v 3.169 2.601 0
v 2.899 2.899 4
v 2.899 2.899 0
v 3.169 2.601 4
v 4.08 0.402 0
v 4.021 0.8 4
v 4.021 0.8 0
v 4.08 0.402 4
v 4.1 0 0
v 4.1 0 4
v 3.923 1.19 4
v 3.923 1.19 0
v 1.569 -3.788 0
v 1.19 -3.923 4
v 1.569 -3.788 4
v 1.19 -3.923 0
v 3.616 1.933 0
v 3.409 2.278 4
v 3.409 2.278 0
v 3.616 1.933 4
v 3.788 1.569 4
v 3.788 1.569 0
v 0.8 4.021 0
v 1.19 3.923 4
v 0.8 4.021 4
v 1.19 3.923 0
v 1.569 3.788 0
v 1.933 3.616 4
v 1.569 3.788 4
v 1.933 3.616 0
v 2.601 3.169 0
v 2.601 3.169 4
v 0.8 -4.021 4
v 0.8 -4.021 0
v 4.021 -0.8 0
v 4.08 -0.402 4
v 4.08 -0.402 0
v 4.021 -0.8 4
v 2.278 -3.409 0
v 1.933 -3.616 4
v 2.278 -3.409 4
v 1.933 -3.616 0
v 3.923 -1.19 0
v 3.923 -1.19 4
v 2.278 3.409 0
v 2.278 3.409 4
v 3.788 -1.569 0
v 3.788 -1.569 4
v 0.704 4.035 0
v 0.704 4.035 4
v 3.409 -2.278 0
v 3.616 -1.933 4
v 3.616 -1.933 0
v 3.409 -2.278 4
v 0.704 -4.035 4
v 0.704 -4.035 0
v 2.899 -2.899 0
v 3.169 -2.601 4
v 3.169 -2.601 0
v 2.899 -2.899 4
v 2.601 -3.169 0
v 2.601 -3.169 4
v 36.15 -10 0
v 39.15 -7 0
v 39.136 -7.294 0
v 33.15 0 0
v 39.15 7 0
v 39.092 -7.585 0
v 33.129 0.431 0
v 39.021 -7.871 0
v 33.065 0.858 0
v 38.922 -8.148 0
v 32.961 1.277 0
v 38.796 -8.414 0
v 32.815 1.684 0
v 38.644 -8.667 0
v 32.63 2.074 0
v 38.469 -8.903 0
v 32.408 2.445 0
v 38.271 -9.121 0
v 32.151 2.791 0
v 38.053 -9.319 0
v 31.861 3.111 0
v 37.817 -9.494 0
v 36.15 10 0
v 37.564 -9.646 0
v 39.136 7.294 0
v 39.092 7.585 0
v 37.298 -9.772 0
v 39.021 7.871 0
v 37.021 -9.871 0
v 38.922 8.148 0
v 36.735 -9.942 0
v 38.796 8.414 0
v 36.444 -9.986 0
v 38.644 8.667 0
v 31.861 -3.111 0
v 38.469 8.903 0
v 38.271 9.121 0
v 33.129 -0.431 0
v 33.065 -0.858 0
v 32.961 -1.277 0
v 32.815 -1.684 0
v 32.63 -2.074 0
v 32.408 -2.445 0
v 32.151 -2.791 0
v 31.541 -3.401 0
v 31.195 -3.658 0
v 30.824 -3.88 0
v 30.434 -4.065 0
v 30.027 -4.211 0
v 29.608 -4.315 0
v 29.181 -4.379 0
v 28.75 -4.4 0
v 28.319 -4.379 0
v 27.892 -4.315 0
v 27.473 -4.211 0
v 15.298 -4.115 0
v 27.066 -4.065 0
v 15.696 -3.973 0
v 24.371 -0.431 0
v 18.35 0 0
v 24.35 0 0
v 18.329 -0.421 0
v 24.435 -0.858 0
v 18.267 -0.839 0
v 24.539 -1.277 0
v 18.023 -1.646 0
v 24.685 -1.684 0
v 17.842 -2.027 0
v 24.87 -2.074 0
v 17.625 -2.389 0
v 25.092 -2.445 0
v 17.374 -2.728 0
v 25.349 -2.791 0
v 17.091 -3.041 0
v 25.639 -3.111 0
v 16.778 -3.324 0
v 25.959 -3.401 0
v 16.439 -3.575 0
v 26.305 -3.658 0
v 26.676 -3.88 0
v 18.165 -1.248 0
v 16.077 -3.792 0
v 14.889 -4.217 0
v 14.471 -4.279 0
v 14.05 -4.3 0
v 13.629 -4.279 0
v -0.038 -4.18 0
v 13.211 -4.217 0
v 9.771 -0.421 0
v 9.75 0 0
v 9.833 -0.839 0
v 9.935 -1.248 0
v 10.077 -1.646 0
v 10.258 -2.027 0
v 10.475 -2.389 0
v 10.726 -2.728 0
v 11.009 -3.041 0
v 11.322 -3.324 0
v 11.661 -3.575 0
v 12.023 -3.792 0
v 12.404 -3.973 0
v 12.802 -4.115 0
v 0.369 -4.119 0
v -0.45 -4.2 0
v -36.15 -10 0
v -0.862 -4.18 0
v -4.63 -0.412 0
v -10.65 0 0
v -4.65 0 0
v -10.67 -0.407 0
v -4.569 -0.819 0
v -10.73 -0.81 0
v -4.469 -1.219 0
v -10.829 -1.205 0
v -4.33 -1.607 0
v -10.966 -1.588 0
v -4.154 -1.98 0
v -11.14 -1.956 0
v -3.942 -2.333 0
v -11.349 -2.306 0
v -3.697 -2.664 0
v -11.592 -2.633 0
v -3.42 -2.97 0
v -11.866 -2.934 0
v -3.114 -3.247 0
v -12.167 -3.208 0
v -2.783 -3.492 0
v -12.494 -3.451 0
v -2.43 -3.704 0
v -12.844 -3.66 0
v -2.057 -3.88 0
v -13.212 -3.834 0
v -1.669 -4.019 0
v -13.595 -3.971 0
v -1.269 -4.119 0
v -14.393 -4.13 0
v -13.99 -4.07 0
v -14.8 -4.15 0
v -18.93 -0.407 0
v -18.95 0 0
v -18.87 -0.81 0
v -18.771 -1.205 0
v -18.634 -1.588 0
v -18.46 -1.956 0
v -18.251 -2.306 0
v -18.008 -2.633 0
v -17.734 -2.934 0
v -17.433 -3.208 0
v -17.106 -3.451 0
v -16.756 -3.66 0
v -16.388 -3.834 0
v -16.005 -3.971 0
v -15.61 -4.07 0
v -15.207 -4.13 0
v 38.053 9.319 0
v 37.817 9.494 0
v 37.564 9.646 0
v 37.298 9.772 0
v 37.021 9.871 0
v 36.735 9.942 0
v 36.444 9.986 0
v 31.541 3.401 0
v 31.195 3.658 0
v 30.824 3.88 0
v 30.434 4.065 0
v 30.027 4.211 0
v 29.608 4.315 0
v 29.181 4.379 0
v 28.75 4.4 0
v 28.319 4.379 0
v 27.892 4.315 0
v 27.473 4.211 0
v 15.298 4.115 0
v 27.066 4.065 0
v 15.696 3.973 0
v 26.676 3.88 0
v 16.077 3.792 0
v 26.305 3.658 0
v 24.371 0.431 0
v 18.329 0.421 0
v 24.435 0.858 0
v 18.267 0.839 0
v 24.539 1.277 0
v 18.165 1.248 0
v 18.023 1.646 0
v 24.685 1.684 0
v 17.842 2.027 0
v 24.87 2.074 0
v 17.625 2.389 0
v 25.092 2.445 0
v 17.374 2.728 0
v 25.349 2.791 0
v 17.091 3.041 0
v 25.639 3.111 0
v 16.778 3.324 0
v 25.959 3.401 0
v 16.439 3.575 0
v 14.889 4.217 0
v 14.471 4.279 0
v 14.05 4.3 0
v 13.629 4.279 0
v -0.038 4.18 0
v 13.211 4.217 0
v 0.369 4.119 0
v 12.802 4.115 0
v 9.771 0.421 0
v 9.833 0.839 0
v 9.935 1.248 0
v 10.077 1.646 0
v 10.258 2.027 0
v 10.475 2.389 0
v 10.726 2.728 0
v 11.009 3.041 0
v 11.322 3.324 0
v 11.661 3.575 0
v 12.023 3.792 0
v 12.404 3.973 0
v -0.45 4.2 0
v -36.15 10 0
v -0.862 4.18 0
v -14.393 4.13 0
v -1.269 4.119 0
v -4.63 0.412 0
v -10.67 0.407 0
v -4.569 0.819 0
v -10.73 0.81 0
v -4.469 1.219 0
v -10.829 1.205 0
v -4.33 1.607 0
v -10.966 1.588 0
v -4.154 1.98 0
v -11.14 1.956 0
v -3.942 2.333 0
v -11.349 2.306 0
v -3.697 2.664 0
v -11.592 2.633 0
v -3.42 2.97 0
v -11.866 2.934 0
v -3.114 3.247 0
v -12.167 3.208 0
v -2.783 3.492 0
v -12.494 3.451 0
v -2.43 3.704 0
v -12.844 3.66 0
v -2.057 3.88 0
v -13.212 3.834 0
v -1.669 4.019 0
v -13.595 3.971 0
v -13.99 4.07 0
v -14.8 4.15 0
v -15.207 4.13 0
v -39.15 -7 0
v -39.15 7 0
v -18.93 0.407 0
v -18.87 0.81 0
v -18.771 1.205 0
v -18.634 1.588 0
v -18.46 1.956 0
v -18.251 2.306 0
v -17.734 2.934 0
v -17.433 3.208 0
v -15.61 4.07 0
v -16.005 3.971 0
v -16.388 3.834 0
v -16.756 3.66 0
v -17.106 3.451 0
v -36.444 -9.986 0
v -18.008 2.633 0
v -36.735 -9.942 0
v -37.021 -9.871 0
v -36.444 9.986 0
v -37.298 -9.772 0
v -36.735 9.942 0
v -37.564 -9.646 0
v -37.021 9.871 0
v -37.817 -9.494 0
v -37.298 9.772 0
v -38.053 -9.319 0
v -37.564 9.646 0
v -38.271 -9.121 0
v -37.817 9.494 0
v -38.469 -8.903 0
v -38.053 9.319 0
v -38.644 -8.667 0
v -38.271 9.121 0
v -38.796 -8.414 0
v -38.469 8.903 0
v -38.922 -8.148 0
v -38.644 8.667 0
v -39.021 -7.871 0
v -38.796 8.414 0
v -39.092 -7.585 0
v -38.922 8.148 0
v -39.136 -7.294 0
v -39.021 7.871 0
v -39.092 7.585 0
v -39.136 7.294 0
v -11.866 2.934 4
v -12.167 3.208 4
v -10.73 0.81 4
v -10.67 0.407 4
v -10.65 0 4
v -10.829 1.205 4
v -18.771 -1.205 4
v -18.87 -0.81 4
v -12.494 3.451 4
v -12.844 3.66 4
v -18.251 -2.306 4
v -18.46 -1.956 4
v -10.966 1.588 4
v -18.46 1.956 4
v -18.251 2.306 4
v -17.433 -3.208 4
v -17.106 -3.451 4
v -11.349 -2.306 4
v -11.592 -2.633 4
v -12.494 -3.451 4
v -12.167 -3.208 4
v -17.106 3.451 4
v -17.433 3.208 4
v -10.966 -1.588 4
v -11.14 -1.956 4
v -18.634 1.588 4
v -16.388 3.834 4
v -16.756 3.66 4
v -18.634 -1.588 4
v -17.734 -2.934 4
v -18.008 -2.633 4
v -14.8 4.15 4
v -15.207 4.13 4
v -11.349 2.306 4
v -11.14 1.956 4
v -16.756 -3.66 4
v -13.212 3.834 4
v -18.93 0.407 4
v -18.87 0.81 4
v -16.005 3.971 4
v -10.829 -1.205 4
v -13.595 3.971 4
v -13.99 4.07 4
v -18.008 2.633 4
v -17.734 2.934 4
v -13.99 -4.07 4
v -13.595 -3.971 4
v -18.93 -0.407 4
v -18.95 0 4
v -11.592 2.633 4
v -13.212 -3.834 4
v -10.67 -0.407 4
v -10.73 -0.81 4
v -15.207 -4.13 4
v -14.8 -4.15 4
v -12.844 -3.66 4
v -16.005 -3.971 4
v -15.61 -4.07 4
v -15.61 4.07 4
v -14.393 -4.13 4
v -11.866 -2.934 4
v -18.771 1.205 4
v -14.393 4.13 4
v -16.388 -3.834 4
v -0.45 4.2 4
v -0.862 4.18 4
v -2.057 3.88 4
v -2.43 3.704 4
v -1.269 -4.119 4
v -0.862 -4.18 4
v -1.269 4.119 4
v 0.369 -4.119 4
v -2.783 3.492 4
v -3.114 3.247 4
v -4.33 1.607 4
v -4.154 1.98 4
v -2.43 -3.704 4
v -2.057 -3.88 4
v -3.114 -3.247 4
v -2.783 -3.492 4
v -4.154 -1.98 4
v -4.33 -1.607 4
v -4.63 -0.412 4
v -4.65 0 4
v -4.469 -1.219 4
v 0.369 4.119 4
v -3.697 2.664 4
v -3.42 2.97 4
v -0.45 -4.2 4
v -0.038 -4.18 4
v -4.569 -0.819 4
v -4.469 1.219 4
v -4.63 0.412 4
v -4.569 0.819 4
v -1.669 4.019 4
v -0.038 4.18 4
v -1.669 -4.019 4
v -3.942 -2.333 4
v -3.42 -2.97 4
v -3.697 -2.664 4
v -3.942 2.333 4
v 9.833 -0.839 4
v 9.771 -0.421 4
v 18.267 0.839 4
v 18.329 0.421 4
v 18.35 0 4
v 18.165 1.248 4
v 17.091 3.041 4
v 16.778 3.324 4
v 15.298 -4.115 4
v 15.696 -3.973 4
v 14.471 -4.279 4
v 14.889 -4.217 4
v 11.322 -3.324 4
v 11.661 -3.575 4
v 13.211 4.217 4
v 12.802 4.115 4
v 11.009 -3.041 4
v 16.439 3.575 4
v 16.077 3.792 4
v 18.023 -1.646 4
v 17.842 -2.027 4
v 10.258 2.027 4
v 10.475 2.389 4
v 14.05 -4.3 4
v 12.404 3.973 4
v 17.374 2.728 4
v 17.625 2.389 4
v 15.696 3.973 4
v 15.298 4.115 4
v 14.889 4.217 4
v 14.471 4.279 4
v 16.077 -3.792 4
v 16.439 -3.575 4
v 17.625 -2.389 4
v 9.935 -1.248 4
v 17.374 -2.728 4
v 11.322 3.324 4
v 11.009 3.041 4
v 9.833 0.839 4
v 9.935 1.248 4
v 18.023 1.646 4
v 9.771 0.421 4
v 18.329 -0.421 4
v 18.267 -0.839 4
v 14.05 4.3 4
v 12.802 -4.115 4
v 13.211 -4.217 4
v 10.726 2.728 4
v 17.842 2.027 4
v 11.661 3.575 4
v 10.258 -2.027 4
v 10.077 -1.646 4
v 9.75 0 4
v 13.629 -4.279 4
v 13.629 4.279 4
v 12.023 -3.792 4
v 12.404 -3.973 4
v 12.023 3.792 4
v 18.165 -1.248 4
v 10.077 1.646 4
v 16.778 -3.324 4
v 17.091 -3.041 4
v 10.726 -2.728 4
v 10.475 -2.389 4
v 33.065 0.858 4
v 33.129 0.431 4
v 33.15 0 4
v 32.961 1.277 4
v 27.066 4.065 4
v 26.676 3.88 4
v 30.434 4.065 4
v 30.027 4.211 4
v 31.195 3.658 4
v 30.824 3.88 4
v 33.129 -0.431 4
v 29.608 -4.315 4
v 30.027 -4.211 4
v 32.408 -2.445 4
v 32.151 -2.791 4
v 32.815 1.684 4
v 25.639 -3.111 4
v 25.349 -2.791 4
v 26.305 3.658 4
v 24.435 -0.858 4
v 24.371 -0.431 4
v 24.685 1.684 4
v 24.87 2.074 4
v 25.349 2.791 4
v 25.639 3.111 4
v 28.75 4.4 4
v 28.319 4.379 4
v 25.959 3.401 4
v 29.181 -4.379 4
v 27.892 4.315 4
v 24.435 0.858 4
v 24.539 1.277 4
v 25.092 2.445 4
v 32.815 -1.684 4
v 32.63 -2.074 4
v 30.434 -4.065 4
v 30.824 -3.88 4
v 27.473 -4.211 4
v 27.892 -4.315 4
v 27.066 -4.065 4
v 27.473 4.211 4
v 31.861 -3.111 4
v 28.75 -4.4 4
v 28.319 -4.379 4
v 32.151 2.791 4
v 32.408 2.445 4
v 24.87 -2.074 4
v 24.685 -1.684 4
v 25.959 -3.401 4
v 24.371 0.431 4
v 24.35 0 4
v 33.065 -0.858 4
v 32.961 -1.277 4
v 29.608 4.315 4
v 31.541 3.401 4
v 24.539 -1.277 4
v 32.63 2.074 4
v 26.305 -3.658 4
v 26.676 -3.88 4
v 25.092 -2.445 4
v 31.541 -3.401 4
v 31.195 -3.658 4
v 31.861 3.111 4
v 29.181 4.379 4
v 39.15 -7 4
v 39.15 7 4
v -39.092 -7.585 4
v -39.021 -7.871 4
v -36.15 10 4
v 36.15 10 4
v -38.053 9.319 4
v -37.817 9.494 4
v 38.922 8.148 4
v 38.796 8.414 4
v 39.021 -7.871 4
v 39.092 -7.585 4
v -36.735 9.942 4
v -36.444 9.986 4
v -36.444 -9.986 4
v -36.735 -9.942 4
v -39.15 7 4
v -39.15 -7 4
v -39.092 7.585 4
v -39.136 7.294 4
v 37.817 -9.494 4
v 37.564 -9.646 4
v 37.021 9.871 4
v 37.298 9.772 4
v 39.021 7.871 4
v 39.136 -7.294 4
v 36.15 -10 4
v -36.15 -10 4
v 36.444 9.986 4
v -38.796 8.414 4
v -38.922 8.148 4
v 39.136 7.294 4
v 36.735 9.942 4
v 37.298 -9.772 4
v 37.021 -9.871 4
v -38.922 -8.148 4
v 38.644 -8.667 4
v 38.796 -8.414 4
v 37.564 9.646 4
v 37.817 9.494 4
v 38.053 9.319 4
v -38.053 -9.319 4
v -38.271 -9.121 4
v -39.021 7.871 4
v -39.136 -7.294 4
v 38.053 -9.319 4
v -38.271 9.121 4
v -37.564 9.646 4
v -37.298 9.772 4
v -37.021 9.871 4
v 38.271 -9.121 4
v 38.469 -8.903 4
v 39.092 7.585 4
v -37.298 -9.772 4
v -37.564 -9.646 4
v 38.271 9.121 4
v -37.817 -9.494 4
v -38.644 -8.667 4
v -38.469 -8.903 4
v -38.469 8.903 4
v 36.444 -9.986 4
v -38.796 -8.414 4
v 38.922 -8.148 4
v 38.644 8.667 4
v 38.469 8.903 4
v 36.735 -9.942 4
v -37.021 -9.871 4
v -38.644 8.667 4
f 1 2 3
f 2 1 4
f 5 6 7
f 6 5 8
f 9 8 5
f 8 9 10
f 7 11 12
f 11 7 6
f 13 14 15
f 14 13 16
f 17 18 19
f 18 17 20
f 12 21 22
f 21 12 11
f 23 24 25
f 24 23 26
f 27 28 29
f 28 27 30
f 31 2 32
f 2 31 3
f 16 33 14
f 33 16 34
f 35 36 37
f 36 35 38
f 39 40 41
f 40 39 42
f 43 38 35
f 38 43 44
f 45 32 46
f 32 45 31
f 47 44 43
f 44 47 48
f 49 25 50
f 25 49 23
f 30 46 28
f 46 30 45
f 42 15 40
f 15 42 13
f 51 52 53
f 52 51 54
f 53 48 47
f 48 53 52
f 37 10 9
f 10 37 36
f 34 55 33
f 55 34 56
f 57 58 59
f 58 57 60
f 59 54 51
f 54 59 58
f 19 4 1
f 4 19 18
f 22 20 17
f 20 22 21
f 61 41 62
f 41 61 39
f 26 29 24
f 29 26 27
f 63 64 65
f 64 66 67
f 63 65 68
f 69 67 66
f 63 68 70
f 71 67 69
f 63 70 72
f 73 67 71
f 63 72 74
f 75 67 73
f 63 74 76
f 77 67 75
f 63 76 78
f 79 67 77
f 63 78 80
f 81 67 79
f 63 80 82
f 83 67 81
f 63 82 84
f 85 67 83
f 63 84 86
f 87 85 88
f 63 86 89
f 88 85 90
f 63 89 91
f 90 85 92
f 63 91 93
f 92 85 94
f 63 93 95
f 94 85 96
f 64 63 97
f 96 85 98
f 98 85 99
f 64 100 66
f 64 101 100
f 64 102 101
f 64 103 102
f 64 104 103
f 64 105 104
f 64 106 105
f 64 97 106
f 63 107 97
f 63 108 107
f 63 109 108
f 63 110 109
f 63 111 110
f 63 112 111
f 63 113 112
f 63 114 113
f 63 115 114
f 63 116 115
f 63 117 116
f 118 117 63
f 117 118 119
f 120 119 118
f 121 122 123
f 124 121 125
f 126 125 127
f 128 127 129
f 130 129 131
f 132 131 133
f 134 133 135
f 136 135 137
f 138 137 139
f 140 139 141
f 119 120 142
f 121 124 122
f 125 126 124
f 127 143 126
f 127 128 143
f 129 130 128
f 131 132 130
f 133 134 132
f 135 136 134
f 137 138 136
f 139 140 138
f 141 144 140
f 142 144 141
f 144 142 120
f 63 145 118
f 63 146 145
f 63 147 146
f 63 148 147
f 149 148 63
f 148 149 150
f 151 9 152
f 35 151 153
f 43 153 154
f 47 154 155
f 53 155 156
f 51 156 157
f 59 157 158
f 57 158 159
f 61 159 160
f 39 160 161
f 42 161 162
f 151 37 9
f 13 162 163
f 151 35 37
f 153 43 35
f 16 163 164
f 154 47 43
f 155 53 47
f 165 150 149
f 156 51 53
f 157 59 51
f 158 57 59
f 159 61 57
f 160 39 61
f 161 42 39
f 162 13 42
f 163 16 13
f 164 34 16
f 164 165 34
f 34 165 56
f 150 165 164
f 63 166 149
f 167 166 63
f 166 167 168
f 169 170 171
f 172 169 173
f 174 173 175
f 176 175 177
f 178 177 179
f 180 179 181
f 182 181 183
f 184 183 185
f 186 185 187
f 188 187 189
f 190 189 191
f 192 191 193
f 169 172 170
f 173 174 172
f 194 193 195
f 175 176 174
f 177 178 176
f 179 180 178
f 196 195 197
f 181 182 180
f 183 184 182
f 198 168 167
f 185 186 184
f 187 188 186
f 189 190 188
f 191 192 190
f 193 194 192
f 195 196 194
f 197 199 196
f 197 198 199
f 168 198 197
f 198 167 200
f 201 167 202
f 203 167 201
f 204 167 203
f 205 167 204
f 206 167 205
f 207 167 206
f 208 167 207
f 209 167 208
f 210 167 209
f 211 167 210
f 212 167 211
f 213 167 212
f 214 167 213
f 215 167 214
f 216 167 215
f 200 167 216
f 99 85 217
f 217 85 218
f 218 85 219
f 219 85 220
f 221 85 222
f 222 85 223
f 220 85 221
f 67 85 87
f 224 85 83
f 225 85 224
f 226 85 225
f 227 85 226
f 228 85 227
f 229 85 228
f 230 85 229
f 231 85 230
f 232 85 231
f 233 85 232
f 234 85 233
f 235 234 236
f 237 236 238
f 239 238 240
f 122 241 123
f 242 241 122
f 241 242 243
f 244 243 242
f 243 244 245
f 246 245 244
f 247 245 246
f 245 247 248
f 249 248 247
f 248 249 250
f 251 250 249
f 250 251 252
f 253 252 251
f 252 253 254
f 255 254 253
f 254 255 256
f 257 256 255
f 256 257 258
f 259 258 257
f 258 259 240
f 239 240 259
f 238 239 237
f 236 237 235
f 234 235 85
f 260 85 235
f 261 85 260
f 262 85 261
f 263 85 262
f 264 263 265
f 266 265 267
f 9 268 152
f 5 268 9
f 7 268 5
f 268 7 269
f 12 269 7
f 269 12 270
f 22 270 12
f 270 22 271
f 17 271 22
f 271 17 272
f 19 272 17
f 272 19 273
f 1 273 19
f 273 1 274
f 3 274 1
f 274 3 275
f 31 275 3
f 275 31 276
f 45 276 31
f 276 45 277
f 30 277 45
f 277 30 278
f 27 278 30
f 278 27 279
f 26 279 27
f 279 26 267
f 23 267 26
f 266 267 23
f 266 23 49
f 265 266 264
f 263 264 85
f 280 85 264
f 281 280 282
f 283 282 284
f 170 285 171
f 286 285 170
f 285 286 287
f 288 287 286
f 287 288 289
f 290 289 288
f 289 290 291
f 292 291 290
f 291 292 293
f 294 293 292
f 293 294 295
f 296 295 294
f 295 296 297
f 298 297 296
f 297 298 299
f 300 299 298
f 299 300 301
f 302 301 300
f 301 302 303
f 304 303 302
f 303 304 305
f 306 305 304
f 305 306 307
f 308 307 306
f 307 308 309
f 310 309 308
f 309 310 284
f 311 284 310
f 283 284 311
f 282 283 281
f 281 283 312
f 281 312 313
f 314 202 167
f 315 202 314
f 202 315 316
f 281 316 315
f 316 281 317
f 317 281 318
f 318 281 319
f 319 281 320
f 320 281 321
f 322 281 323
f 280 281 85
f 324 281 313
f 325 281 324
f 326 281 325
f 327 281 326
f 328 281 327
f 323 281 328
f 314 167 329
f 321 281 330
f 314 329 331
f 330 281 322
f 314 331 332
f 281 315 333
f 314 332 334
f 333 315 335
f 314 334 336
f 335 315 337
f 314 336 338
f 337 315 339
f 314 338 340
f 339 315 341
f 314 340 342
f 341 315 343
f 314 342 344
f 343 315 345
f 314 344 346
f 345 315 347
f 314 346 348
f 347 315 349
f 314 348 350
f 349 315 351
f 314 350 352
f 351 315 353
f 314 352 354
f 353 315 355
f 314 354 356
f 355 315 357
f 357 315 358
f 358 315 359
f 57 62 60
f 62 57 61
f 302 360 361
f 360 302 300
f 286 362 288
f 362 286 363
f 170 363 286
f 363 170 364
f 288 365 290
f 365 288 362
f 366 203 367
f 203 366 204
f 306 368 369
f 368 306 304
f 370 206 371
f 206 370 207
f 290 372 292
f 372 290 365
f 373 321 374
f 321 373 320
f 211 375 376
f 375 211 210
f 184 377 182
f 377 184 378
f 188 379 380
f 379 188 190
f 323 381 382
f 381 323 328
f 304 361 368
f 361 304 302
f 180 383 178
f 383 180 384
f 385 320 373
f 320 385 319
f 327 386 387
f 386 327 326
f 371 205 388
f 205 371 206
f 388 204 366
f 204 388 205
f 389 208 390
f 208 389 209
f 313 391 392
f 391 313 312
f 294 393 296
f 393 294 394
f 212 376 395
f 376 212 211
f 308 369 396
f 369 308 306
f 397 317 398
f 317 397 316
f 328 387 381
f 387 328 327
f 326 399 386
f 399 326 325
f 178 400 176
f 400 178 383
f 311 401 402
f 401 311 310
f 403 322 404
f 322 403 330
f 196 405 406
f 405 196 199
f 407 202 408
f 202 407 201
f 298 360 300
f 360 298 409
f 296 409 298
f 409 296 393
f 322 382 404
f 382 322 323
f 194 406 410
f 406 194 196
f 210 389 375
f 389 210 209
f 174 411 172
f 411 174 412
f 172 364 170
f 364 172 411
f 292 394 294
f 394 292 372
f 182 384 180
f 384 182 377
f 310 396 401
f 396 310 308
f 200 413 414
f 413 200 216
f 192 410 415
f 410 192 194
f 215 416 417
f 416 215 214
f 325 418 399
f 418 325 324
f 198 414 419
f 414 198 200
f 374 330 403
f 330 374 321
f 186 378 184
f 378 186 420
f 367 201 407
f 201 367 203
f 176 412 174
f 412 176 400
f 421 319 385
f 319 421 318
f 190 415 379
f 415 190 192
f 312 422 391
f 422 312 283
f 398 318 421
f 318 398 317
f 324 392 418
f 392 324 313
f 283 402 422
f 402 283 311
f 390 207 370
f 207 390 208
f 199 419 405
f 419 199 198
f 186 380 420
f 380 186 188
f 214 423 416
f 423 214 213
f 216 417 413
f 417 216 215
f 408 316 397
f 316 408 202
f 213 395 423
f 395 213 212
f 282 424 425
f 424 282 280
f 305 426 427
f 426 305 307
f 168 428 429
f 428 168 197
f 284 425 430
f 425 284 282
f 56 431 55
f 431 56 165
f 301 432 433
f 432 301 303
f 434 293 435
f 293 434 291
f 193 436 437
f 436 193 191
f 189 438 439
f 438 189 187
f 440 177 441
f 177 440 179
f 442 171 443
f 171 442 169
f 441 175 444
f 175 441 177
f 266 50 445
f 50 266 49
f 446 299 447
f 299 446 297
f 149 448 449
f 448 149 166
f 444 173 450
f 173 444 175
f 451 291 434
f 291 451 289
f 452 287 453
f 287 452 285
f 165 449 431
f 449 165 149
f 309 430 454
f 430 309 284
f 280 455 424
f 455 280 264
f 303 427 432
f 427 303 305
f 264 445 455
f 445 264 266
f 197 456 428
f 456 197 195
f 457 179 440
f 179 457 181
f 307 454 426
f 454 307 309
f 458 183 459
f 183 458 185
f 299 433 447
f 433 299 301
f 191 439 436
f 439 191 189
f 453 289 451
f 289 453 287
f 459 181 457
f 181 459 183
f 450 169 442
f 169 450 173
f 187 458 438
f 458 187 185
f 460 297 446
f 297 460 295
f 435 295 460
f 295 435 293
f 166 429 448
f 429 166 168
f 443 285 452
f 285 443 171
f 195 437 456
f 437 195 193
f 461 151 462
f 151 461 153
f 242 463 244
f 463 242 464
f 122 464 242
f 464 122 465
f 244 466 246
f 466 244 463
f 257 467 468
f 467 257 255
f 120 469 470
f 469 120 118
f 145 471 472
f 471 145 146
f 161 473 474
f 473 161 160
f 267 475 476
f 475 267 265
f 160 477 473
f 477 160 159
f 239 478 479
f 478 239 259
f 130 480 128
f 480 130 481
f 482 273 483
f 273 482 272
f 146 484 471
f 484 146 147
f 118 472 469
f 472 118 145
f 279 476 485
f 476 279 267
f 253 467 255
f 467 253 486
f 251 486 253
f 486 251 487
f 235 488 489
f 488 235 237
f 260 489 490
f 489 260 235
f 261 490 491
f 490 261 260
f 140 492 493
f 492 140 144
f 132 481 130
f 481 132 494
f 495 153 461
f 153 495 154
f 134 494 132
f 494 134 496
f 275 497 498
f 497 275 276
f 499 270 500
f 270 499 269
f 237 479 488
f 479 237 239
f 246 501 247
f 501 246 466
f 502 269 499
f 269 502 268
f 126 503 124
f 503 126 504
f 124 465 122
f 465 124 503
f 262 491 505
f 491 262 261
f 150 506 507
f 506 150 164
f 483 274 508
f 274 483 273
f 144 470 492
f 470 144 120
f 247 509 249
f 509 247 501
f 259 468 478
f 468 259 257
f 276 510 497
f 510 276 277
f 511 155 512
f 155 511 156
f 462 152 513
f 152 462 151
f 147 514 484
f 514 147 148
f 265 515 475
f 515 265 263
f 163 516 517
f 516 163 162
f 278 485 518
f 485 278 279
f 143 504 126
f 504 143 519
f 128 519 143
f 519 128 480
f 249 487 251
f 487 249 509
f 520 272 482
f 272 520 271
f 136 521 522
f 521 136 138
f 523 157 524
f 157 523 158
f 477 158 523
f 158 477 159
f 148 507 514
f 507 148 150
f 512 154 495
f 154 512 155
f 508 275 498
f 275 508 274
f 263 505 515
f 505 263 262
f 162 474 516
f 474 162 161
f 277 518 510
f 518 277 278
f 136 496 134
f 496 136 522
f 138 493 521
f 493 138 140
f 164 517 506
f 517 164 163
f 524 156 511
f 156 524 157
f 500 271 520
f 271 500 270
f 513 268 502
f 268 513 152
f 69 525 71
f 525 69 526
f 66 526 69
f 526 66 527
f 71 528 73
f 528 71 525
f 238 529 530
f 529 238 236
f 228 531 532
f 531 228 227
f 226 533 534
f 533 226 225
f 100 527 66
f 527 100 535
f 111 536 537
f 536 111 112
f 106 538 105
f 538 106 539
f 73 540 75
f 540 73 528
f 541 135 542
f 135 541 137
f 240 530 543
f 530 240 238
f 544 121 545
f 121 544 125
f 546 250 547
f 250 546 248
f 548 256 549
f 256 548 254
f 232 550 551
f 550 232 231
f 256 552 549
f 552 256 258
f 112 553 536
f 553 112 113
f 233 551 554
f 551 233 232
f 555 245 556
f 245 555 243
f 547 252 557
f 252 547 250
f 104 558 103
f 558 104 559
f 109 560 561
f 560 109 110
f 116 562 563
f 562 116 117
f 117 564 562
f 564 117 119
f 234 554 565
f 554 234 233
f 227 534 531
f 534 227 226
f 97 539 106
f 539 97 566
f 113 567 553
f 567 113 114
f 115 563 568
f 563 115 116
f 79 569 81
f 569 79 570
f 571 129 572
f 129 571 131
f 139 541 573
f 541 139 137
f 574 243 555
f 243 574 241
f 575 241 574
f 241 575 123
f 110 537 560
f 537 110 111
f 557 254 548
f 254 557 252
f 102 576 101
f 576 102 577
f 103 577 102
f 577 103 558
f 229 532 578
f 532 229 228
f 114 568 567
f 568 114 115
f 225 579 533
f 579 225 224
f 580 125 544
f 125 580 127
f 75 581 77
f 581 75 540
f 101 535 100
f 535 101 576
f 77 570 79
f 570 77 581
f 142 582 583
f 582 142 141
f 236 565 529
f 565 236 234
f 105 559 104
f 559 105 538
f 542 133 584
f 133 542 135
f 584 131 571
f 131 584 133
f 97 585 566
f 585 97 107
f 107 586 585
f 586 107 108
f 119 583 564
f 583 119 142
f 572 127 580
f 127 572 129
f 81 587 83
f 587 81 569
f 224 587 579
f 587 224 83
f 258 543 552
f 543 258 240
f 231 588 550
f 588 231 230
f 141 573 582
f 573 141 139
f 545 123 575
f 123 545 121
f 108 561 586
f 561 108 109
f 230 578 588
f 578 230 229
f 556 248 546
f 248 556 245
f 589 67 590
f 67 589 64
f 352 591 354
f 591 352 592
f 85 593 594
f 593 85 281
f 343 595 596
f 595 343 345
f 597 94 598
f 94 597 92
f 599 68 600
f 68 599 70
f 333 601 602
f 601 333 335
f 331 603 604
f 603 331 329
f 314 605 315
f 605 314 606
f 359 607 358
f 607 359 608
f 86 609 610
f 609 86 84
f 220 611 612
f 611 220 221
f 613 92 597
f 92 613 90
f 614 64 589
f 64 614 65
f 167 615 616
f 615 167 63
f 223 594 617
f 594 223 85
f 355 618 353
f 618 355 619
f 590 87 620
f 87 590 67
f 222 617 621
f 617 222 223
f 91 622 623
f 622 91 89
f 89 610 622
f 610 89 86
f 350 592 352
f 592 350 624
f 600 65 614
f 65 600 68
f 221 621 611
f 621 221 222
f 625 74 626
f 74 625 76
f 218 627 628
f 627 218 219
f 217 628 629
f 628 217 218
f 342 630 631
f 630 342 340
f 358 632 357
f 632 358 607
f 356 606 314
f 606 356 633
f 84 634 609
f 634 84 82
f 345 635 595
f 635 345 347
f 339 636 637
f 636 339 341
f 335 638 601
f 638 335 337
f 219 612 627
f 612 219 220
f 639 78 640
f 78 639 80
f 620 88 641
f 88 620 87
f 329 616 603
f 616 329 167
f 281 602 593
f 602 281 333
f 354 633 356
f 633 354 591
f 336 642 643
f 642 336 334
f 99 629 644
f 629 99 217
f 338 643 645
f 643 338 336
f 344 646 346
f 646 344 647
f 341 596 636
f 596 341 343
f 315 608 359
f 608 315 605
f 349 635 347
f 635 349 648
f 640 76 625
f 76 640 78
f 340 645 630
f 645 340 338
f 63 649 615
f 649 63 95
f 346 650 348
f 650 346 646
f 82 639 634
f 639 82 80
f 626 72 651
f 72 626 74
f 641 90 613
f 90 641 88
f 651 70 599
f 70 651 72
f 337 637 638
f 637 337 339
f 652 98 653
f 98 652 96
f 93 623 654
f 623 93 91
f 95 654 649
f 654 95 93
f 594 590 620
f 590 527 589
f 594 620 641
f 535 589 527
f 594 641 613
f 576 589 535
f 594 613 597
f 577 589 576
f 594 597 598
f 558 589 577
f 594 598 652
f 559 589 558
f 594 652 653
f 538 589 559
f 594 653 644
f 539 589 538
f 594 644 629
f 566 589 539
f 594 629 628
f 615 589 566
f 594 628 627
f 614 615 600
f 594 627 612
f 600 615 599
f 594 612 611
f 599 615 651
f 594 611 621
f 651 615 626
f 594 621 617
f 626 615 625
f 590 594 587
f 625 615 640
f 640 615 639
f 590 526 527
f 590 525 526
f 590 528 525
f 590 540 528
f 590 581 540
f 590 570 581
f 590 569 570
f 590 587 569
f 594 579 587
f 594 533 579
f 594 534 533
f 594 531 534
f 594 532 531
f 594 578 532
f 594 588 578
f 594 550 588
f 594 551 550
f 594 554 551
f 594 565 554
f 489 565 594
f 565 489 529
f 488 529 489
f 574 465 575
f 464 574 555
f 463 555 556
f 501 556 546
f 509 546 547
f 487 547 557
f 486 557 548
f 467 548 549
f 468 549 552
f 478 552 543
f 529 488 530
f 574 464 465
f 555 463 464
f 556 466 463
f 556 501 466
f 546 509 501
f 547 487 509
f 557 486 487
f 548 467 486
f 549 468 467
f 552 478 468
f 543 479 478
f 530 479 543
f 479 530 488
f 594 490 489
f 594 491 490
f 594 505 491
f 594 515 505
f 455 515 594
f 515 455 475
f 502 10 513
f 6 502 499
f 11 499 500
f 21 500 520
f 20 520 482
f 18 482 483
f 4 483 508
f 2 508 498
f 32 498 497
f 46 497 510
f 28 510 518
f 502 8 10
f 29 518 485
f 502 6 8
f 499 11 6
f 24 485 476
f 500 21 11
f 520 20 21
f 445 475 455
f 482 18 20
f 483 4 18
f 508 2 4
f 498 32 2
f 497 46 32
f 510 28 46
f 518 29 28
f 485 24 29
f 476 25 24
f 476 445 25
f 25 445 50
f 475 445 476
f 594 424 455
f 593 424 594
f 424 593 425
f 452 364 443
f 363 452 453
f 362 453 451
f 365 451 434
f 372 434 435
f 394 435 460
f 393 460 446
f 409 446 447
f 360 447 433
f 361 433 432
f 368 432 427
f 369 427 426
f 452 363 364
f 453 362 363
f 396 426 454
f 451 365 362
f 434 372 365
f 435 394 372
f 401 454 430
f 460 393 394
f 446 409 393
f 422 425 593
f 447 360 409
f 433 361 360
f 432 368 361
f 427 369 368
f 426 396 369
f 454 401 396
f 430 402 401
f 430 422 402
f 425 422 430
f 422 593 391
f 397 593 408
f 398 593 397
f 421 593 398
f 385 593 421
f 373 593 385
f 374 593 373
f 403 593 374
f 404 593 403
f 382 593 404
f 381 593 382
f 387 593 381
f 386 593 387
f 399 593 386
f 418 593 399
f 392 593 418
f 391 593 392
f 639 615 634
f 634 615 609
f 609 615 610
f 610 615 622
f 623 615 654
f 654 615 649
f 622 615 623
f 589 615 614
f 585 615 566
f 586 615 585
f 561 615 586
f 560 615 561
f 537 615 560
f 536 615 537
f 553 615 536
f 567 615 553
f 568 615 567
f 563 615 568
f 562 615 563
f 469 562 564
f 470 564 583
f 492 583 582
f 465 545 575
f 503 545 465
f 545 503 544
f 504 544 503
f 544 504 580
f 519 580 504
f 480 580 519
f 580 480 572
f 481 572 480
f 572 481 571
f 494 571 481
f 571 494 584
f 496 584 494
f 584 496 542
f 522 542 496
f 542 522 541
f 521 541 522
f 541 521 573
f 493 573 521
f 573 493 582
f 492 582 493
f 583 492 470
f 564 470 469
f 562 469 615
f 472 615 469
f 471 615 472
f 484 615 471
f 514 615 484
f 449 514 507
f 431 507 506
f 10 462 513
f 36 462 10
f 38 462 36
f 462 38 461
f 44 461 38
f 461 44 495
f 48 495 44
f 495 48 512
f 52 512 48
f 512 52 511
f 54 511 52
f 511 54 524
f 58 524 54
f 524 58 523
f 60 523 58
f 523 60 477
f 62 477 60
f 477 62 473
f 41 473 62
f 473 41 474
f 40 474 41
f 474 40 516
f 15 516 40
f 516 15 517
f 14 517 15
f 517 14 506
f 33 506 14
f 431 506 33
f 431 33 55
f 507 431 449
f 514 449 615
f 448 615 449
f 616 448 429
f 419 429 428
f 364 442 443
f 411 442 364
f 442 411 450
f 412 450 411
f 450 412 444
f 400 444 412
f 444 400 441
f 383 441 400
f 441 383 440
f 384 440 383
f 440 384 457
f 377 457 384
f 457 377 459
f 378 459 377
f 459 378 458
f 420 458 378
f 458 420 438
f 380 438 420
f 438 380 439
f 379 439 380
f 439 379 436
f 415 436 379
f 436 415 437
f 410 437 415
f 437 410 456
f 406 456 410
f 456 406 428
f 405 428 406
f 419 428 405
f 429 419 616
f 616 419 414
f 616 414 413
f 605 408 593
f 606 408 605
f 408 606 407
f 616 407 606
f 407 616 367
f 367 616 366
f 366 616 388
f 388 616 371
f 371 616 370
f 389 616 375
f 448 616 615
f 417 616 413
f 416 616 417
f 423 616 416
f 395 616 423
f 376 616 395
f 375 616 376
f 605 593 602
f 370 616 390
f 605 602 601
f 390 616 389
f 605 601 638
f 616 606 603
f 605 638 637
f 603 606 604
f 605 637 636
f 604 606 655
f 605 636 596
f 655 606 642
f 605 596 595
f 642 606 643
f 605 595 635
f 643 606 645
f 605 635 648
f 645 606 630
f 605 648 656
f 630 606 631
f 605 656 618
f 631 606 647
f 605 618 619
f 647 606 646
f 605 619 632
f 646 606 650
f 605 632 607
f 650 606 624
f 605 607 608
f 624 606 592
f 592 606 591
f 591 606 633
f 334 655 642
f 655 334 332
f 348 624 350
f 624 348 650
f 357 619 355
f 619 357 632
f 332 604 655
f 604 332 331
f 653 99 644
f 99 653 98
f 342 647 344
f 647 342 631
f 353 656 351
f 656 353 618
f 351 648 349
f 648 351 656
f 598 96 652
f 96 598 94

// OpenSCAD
// Calibrador de folga (clearance) -- OpenSCAD
//
// Uma placa com 5 furos de diametro crescente + um pino de 8 mm.
// Imprima, descubra em qual furo o pino entra com aperto suave e use
// essa folga como padrao em todas as pecas com encaixe.
//
// Render pela linha de comando:
//   openscad -o clearance_plate.stl -D 'parte="placa"' clearance_gauge.scad
//   openscad -o clearance_pin.stl   -D 'parte="pino"'  clearance_gauge.scad
//
// Ou abra na GUI e use o Customizer.

PIN_D      = 8.0;
CLEARANCES = [0.10, 0.15, 0.20, 0.30, 0.40];
PLATE_T    = 4.0;
GAP        = 6.0;
MARGIN     = 6.0;
R_CANTO    = 3.0;

parte = "placa";   // [placa, pino]

// OpenSCAD nao tem sum() embutido
function sumv(v, i = 0, acc = 0) =
    i >= len(v) ? acc : sumv(v, i + 1, acc + v[i]);

hole_ds = [for (c = CLEARANCES) PIN_D + 2 * c];
largura = MARGIN * 2 + sumv(hole_ds) + GAP * (len(hole_ds) - 1);
altura  = PIN_D + MARGIN * 2;

// centro X de cada furo, na ordem de CLEARANCES
xs = [for (i = [0 : len(hole_ds) - 1])
         -largura / 2 + MARGIN
         + sumv([for (j = [0 : i - 1]) hole_ds[j] + GAP])
         + hole_ds[i] / 2];

module placa() {
    difference() {
        hull() {
            for (dx = [-largura / 2 + R_CANTO, largura / 2 - R_CANTO])
                for (dy = [-altura / 2 + R_CANTO, altura / 2 - R_CANTO])
                    translate([dx, dy, 0])
                        cylinder(r = R_CANTO, h = PLATE_T, $fn = 64);
        }
        for (i = [0 : len(hole_ds) - 1])
            translate([xs[i], 0, -1])
                cylinder(d = hole_ds[i], h = PLATE_T + 2, $fn = 64);
    }
}

module pino() {
    cylinder(d = PIN_D, h = 18, $fn = 64);
    translate([0, 0, 18])
        cylinder(d = PIN_D + 6, h = 3, $fn = 64);
}

if (parte == "placa") placa();
else pino();

echo(str("placa ", largura, " x ", altura, " x ", PLATE_T, " mm"));
echo(str("furos: ", hole_ds));
